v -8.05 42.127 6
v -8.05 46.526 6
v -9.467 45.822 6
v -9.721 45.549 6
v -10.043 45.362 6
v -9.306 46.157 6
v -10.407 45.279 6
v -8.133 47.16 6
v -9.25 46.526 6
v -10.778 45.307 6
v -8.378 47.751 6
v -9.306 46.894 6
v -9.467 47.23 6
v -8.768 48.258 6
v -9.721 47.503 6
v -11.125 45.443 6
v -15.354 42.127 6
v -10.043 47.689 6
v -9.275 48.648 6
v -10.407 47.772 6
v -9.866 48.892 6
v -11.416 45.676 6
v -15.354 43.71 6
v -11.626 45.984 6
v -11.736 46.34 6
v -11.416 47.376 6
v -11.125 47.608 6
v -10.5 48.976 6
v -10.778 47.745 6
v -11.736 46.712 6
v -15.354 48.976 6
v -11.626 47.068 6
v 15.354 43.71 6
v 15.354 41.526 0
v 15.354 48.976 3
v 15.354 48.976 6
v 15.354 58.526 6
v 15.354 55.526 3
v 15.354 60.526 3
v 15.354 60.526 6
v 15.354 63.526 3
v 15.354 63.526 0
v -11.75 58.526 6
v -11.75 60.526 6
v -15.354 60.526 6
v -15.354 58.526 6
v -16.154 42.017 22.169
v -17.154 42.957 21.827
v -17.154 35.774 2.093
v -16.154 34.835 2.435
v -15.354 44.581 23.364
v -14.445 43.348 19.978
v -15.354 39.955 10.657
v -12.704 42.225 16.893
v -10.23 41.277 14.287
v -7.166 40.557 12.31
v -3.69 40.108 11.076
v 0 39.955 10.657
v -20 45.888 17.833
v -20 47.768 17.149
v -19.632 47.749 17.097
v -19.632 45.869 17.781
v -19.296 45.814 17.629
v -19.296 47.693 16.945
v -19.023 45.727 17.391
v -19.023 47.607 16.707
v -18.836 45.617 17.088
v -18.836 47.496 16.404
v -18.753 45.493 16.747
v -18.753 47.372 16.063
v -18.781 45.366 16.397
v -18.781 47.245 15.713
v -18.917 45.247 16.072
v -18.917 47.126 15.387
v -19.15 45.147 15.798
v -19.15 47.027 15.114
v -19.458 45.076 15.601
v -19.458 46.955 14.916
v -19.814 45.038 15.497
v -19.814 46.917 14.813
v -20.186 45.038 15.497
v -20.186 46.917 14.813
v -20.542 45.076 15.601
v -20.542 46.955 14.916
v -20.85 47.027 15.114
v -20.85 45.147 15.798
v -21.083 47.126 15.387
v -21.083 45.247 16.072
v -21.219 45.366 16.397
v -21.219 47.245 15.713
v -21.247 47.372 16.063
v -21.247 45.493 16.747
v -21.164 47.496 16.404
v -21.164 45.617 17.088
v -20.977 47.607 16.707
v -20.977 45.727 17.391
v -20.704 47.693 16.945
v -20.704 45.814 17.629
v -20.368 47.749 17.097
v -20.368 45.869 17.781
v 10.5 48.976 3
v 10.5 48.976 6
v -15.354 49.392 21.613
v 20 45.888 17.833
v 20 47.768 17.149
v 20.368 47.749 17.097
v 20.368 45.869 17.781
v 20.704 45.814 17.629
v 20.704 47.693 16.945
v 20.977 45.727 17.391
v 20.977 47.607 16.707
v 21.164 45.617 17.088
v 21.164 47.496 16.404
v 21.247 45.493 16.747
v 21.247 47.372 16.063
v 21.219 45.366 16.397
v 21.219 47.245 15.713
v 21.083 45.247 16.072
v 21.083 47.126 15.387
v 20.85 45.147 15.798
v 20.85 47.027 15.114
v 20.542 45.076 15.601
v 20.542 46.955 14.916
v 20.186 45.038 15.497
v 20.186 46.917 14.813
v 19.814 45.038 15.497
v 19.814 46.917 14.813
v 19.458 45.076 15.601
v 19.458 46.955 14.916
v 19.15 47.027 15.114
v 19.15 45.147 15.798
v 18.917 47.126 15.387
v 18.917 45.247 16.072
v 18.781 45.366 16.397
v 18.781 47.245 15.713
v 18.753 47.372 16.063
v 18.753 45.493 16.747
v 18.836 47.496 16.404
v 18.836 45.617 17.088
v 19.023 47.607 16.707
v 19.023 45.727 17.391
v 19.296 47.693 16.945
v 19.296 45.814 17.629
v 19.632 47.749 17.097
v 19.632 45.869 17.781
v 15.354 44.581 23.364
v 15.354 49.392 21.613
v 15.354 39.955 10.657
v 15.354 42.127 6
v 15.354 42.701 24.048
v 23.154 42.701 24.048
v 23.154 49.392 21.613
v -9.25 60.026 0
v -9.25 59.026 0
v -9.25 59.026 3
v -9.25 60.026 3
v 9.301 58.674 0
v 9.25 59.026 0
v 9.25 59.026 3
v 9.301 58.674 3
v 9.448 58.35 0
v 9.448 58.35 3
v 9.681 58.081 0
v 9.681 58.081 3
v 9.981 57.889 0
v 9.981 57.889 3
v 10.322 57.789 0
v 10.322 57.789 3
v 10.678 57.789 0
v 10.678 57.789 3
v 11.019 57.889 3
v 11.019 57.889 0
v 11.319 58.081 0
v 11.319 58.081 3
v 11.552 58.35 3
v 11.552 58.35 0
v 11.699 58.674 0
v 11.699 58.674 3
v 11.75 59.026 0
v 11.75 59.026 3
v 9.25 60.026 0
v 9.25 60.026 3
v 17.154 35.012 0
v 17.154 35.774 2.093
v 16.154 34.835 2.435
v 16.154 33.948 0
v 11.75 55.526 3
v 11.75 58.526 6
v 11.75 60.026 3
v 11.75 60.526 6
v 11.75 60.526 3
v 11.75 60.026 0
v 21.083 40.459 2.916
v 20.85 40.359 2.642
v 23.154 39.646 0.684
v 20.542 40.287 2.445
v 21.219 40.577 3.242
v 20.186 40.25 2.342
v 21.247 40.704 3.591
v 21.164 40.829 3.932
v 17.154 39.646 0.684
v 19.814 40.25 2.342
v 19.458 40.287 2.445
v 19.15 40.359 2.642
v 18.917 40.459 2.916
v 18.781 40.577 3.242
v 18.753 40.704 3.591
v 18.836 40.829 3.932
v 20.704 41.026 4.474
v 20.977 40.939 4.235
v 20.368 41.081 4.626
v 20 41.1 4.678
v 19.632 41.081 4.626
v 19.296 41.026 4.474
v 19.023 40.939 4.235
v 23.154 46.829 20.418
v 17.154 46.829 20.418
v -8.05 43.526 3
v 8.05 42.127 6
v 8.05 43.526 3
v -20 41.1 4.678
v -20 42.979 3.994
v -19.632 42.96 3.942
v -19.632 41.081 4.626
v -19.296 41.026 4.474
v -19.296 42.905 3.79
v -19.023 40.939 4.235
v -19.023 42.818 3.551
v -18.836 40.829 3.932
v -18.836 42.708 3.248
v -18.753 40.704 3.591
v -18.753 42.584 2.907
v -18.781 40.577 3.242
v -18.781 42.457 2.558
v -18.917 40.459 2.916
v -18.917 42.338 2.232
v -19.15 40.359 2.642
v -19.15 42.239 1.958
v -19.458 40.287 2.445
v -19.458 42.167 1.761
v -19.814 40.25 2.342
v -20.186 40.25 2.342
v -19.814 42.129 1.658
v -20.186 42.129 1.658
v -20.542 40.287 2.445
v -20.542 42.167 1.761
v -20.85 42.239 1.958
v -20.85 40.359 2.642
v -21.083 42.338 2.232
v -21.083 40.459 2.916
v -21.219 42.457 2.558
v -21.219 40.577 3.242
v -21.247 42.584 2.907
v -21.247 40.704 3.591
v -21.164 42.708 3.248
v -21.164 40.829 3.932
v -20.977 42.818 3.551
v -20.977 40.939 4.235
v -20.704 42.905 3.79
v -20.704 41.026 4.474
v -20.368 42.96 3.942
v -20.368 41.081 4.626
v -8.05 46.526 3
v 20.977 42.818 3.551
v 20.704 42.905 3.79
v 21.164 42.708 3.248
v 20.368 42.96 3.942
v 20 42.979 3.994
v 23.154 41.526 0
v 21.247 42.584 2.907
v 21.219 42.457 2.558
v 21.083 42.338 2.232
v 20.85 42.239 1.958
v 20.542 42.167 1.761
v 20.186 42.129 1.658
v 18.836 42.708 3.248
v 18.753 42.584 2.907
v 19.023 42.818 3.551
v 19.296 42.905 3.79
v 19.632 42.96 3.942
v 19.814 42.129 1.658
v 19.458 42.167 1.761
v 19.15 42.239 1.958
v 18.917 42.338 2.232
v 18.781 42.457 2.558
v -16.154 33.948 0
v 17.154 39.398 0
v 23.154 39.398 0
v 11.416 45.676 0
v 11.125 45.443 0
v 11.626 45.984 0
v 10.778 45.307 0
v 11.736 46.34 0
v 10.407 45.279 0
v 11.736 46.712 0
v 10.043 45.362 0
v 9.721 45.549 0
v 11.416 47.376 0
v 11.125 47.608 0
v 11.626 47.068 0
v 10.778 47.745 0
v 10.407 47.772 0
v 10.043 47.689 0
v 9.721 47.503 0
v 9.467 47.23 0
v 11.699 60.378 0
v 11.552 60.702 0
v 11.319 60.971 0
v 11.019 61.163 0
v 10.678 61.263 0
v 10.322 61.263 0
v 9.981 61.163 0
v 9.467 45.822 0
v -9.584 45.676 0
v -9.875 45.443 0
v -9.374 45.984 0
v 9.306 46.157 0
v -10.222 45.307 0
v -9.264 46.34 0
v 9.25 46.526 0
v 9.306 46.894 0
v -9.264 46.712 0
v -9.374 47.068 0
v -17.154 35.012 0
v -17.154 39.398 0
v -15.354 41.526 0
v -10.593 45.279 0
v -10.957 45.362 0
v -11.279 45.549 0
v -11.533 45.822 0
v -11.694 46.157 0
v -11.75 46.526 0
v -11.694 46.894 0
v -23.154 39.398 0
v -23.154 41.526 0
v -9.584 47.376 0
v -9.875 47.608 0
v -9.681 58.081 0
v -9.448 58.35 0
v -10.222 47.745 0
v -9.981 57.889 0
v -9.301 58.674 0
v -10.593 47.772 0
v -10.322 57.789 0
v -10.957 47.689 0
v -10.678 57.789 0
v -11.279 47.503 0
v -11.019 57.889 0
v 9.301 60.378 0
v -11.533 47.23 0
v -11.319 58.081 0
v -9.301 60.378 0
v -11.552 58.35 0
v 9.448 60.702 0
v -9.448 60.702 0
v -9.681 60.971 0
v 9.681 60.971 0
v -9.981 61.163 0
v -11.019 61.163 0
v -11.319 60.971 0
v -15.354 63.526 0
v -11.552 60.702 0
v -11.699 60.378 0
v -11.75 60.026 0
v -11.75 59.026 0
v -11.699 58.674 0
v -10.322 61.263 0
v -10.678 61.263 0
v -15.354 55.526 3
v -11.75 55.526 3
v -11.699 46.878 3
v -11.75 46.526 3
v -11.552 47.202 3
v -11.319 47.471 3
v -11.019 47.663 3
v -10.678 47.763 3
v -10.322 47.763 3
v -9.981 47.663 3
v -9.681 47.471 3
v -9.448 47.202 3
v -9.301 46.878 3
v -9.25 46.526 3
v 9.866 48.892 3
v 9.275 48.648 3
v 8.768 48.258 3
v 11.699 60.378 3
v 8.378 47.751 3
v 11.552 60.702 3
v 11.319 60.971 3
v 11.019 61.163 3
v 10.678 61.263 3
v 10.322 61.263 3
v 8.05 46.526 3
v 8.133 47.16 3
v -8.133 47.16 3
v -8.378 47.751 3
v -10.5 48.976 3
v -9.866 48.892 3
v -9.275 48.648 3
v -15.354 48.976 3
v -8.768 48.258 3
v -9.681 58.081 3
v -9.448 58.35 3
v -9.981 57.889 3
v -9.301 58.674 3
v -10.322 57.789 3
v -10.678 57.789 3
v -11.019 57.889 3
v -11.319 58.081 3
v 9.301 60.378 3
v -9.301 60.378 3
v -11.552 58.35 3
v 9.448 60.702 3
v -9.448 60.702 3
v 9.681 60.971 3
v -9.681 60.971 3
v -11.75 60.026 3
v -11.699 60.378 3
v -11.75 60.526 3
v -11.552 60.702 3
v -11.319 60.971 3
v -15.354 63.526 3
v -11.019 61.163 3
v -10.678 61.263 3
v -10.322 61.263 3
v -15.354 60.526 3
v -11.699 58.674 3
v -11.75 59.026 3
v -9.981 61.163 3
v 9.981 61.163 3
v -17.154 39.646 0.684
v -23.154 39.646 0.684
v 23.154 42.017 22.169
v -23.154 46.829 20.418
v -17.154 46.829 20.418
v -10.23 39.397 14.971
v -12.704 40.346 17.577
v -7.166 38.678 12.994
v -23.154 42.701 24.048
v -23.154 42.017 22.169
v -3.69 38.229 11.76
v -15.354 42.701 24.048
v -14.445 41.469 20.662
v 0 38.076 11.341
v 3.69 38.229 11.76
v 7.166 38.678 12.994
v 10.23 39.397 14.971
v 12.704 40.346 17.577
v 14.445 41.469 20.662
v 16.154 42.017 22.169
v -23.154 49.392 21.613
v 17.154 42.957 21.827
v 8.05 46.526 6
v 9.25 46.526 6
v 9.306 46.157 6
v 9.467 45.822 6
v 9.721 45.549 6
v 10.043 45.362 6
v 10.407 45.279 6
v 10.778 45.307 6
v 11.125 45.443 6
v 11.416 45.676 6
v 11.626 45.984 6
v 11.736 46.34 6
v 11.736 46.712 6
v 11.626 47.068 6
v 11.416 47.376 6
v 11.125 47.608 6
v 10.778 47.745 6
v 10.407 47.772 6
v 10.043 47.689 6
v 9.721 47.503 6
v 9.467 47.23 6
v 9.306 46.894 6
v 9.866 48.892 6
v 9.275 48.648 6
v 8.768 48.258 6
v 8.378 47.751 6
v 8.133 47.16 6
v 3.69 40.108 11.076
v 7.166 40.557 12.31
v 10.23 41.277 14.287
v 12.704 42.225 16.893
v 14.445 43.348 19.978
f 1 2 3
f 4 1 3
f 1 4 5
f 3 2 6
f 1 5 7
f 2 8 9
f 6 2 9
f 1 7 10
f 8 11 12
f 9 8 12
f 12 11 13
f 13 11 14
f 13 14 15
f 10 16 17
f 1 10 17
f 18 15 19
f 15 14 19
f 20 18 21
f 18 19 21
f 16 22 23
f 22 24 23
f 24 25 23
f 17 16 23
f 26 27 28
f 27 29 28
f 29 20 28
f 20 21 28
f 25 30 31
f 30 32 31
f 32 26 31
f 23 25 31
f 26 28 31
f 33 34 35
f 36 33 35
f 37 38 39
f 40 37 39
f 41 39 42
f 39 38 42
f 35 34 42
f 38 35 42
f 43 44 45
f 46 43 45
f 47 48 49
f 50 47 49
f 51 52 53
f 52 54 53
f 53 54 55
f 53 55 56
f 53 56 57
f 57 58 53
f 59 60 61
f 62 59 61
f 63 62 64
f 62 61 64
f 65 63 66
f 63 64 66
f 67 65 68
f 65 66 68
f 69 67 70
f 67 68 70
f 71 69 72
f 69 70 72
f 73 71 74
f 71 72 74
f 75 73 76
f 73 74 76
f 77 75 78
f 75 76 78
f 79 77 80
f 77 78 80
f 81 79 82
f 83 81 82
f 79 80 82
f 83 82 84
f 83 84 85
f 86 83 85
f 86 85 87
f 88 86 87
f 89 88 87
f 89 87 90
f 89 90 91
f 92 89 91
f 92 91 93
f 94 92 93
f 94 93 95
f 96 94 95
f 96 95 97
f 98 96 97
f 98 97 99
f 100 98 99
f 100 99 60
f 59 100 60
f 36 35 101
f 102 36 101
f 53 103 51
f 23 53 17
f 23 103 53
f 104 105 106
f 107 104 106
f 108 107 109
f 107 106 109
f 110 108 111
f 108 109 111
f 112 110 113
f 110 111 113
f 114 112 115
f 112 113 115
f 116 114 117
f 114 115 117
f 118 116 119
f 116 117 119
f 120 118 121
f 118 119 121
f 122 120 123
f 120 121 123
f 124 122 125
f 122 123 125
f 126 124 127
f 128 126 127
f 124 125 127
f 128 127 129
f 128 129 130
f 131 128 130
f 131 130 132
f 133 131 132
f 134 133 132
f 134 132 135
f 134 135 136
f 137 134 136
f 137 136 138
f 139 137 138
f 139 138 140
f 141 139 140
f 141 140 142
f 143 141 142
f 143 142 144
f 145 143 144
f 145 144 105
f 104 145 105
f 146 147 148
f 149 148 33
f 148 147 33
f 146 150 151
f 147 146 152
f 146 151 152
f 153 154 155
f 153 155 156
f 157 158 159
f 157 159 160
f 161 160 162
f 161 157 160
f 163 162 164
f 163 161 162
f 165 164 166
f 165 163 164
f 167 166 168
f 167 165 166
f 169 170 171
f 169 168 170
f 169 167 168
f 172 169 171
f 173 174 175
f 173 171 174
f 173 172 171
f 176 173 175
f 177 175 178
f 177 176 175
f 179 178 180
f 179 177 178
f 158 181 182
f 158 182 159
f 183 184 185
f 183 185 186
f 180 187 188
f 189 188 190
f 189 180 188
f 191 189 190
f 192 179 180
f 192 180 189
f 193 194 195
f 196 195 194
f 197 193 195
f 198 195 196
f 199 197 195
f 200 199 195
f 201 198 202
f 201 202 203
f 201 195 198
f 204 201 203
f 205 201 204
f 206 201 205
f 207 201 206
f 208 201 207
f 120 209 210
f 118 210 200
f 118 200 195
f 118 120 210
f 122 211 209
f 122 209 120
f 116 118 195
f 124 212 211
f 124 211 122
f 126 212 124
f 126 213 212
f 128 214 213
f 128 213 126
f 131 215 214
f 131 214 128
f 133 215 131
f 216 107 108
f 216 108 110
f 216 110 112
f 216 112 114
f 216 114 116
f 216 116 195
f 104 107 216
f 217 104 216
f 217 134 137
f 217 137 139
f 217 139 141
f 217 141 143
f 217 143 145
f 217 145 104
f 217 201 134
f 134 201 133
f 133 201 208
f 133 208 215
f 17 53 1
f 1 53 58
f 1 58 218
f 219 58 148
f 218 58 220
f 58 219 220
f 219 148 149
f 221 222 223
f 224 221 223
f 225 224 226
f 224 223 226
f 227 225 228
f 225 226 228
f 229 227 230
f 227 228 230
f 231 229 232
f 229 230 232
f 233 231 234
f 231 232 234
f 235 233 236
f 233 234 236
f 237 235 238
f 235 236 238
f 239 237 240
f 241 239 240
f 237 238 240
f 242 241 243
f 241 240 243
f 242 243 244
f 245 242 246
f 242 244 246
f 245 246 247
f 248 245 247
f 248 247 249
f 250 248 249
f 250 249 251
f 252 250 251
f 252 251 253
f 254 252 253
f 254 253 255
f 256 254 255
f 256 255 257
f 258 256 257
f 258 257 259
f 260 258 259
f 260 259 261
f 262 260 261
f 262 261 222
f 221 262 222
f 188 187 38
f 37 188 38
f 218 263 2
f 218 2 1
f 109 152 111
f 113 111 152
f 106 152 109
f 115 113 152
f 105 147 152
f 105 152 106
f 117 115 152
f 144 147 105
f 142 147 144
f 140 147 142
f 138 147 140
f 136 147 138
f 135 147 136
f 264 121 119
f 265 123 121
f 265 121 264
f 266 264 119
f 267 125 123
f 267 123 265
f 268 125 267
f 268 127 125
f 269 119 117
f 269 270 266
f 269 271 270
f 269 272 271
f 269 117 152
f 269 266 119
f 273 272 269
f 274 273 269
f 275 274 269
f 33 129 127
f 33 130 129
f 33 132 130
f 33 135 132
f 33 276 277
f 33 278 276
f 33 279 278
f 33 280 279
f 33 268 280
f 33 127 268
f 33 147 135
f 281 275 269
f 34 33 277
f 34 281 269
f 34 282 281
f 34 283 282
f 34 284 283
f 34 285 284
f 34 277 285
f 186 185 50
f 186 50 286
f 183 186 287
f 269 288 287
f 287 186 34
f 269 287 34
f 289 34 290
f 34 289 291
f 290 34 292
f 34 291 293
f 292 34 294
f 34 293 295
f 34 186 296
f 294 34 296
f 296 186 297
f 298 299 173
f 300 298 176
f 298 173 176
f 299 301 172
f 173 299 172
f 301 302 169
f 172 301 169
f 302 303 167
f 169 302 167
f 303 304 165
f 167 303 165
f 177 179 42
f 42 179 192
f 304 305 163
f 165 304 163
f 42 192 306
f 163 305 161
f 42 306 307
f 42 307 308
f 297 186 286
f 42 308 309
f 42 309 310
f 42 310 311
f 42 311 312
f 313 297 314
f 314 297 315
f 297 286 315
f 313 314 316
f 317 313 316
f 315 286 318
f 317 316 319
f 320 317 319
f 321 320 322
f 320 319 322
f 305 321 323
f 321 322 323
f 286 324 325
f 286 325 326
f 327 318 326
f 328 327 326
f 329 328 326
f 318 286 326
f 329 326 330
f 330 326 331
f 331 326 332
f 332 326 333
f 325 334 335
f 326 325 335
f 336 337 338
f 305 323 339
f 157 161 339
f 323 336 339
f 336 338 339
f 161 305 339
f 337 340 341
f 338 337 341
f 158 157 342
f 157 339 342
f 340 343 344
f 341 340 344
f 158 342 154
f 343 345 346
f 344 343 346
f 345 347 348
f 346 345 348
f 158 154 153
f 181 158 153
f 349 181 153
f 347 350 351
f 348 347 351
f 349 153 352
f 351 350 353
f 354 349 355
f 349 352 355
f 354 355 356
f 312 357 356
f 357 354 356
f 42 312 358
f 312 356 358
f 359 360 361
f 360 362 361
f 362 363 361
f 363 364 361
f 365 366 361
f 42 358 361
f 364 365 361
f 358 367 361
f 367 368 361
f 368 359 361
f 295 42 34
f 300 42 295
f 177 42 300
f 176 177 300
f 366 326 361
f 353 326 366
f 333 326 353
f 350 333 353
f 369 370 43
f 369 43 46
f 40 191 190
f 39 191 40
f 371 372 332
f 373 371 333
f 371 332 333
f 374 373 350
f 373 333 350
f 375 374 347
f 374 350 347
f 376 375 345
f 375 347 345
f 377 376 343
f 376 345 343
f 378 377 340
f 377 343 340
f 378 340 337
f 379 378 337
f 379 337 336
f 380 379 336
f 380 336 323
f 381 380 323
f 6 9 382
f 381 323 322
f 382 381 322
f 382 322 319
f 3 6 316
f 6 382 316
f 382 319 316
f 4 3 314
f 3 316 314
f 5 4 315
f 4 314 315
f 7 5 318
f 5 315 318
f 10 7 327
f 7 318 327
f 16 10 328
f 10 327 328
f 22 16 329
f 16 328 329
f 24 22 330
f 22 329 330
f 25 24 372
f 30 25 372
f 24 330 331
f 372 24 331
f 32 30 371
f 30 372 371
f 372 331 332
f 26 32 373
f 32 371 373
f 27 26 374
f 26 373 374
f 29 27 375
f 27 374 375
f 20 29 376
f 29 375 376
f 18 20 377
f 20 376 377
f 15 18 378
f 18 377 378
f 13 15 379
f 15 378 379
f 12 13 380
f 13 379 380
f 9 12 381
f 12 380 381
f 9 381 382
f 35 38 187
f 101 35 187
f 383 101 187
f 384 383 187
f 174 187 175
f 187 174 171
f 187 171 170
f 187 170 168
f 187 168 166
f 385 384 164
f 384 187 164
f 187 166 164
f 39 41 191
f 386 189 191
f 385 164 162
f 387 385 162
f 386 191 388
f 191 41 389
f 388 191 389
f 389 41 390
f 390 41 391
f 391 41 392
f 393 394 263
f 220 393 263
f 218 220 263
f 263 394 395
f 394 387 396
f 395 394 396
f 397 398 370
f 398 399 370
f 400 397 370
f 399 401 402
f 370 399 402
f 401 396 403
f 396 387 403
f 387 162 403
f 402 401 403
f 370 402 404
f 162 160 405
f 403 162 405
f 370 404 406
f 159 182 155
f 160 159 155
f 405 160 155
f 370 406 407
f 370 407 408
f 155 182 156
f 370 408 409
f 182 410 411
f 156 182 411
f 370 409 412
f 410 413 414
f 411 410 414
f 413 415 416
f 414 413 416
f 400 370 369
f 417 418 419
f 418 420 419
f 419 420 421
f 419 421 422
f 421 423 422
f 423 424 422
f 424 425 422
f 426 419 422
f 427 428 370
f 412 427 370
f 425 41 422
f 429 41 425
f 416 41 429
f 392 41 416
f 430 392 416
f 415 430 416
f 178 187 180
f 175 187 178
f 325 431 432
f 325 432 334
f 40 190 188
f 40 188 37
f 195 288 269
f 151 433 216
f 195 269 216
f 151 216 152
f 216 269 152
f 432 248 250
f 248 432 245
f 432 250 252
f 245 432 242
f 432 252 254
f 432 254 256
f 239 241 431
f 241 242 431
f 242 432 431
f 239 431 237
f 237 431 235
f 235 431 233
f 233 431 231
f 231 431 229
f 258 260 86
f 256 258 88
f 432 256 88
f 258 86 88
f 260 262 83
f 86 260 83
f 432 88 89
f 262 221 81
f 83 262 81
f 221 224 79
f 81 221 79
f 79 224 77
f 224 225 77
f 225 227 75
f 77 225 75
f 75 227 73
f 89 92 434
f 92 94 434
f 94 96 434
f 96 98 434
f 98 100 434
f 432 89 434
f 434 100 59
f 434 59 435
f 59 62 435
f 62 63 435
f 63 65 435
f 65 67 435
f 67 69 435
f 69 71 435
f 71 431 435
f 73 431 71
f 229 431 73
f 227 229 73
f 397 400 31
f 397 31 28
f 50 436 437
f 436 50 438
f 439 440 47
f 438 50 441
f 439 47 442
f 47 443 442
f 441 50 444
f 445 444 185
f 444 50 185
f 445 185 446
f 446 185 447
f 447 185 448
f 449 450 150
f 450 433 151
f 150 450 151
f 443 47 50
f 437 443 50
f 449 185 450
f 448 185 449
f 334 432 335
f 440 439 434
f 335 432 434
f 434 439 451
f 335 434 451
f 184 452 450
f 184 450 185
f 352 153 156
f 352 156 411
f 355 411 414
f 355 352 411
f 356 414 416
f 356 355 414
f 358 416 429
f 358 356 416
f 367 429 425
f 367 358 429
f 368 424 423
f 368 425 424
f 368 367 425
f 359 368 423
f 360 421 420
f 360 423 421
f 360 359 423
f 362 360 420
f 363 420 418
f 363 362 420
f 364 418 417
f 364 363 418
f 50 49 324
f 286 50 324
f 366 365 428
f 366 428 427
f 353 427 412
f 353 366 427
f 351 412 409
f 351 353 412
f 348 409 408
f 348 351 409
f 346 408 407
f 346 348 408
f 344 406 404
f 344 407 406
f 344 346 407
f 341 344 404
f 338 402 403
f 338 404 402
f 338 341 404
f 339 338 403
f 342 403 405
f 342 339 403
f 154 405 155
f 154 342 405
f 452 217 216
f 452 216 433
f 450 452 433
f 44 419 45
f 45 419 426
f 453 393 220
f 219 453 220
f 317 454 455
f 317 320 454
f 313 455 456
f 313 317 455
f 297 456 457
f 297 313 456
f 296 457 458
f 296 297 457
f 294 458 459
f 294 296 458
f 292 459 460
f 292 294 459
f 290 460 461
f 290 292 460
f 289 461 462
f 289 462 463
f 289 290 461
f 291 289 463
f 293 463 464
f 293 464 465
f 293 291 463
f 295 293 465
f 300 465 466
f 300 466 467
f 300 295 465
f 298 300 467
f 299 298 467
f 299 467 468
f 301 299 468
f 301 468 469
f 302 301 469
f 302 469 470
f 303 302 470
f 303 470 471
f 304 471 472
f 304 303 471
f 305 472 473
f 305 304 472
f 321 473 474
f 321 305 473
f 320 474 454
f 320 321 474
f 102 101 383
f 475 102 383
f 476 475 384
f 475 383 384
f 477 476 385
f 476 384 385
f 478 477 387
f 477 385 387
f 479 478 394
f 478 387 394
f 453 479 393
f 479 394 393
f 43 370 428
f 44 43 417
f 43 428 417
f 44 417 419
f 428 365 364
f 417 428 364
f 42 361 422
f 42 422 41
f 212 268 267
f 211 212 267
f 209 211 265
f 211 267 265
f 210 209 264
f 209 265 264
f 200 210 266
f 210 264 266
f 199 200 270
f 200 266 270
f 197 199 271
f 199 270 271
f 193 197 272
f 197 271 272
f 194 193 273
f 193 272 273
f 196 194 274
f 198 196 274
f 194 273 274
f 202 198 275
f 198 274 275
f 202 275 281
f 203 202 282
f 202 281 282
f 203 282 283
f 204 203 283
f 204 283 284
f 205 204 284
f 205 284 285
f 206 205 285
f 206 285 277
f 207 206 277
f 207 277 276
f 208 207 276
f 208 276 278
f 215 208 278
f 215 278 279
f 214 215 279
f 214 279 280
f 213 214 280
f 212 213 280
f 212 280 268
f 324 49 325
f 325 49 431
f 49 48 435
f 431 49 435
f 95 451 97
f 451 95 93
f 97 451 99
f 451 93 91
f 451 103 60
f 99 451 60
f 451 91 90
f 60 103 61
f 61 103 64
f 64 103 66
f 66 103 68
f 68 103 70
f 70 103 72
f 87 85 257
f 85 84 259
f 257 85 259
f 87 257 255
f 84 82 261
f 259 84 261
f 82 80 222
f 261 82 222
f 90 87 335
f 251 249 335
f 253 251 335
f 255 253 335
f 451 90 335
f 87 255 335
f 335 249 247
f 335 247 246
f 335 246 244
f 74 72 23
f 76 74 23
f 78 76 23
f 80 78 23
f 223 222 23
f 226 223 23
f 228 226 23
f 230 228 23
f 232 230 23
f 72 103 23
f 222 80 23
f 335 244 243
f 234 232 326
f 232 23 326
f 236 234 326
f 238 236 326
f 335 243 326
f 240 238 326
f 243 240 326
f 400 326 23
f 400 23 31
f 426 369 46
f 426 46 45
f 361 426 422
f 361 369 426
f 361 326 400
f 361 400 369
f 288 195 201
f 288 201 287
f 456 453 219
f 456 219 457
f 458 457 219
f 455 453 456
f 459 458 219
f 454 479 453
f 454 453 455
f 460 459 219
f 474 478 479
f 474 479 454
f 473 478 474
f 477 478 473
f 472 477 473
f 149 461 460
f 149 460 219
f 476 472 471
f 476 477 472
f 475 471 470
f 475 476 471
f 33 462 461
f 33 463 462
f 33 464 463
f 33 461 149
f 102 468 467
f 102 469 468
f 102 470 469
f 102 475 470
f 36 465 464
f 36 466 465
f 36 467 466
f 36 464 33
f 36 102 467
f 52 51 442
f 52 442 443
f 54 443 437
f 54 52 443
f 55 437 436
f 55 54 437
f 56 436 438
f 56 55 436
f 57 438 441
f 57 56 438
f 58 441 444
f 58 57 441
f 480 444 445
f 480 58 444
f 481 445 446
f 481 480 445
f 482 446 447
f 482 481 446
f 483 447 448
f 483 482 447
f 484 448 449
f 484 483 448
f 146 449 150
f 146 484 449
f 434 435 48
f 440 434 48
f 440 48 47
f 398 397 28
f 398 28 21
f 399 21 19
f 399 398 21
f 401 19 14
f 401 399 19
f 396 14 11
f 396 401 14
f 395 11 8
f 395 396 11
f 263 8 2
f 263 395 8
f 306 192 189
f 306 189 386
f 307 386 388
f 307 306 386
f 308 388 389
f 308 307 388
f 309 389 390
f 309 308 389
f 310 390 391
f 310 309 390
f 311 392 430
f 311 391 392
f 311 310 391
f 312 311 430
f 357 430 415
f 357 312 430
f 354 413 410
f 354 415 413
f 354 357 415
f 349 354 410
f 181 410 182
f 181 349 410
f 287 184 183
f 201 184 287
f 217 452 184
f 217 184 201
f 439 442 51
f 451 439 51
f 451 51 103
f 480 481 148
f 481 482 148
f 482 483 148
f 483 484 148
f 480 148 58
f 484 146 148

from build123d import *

# Parameters (mm, degrees)
BOSS_EXTRUDE1_DEPTH             = 3
BOSS_EXTRUDE2_REACH             = 67.424
BOSS_EXTRUDE2_DIRECTION_2_REACH = 67.424
BOSS_EXTRUDE3_DEPTH             = 1.8
BOSS_EXTRUDE4_DEPTH             = 6
SKETCH5_R                       = 1.2500000000000013
CUT_EXTRUDE1_DEPTH              = 52.534261642227
BOSS_EXTRUDE5_START             = -17.153882977
BOSS_EXTRUDE5_DEPTH             = 34.307765954
BOSS_EXTRUDE5_START_2           = -23.153882977
BOSS_EXTRUDE5_2_DEPTH           = 46.307765954
SKETCH7_R                       = 1.2499999999999996
CUT_EXTRUDE2_DEPTH              = 72.76321538065721
SKETCH8_R                       = 1.2499999999999996
SKETCH8_W                       = 3.603882977174097
SKETCH8_H                       = 2
BOSS_EXTRUDE6_DEPTH             = 3
CHAMFER1_SIZE                   = 3
CHAMFER3_SIZE                   = 1
CUT_EXTRUDE3_DEPTH              = 54.0045843552169


# Read off the part's stored shape, not the designer's step: Boss-Extrude5
with BuildPart() as part:
    # Sketch1 → Boss-Extrude1 (new body)
    with BuildSketch(Plane.XY):
        Polygon((15.353882977174102, 43.52586008583906), (-15.3538829771741, 43.52586008583904), (-15.3538829771741, 63.52586008583905), (15.3538829771741, 63.52586008583905), align=None)
    extrude(amount=BOSS_EXTRUDE1_DEPTH)

    # Boss-Extrude2: up to this face of the body (flat: up to its plane)
    boss_extrude2_end = Plane(part.part.faces().sort_by_distance((15.353882977, 53.525860086, 1.5))[0])
    # Sketch2 → Boss-Extrude2 (add, up to the picked face)
    with BuildSketch(Plane(origin=(0, 0, 0), x_dir=(0, 0, -1), z_dir=(1, 0, 0)), mode=Mode.PRIVATE) as boss_extrude2_sk1:
        Polygon((-3, 43.52586008583906), (0, 43.52586008583906), (0, 41.52586008583906), (-2.4353936802444784, 34.83467094188486), (-24.048323958320367, 42.701134238375246), (-23.36428367166903, 44.580519479947064), (-10.656874598929635, 39.95540082282564), align=None)
    boss_extrude2_tool1 = split(extrude(boss_extrude2_sk1.sketch, amount=BOSS_EXTRUDE2_REACH, mode=Mode.PRIVATE), bisect_by=boss_extrude2_end, keep=Keep.BOTH, mode=Mode.PRIVATE)
    add(boss_extrude2_tool1.solids().sort_by(Axis((0, 40.026068, 8.762362), (1, 0, 0)))[0])

    # Boss-Extrude2 direction 2: up to this face of the body (flat: up to its plane)
    boss_extrude2_direction_2_end = Plane(part.part.faces().sort_by_distance((-15.353882977, 53.525860086, 1.5))[0])
    # Sketch2 → Boss-Extrude2 direction 2 (add, up to the picked face)
    with BuildSketch(Plane(origin=(0, 0, 0), x_dir=(0, 0, -1), z_dir=(1, 0, 0)), mode=Mode.PRIVATE) as boss_extrude2_direction_2_sk1:
        Polygon((-3, 43.52586008583906), (0, 43.52586008583906), (0, 41.52586008583906), (-2.4353936802444784, 34.83467094188486), (-24.048323958320367, 42.701134238375246), (-23.36428367166903, 44.580519479947064), (-10.656874598929635, 39.95540082282564), align=None)
    boss_extrude2_direction_2_tool1 = split(extrude(boss_extrude2_direction_2_sk1.sketch, amount=-BOSS_EXTRUDE2_DIRECTION_2_REACH, mode=Mode.PRIVATE), bisect_by=boss_extrude2_direction_2_end, keep=Keep.BOTH, mode=Mode.PRIVATE)
    add(boss_extrude2_direction_2_tool1.solids().sort_by(Axis((0, 40.026068, 8.762362), (-1, 0, 0)))[0])

    # Sketch3 → Boss-Extrude3 (add)
    with BuildSketch(Plane(origin=(15.353882977174106, 1.33e-15, 0), x_dir=(0, 0, -1), z_dir=(1, 9e-17, 0))):
        Polygon((-24.048323958320367, 42.701134238375246), (-2.4353936802444798, 34.83467094188486), (3.04e-15, 41.52586008583906), (-21.61293027807589, 49.392323382329444), align=None)
    boss_extrude3 = extrude(amount=BOSS_EXTRUDE3_DEPTH)

    # Sketch4 → Boss-Extrude4 (add)
    with BuildSketch(Plane(origin=(17.1538829771741, 0, 0), x_dir=(0, 0, -1), z_dir=(1, 0, 0))):
        Polygon((-24.048323958320367, 42.701134238375246), (-21.61293027807589, 49.392323382329444), (2.6e-15, 41.52586008583906), (-0.6840402866513355, 39.64647484426724), (-20.41758532315541, 46.82889785410629), (-22.168938716748553, 42.01709395172391), align=None)
    boss_extrude4 = extrude(amount=BOSS_EXTRUDE4_DEPTH)

    # Mirror1: Boss-Extrude3, Boss-Extrude4 across plane
    add(boss_extrude3.mirror(Plane(origin=(0, 0, 0), x_dir=(0, 0, 1), z_dir=(1, 0, 0))))
    add(boss_extrude4.mirror(Plane(origin=(0, 0, 0), x_dir=(0, 0, 1), z_dir=(1, 0, 0))))

    # Sketch5 → Cut-Extrude1 (cut, through all)
    with BuildSketch(Plane(origin=(3.18e-15, 36.66825722516614, -13.34615417237709), x_dir=(1, -8e-17, 3e-17), z_dir=(0, 0.9396926207859083, -0.3420201433256693))):
        with Locations(Location((-20.000000000000004, -31.20268061828034, 0), (0, 0, 270))):
            Circle(SKETCH5_R)
        with Locations(Location((-20.000000000000004, -17.20268061828034, 0), (0, 0, 270))):
            Circle(SKETCH5_R)
        with Locations(Location((19.999999999999996, -17.202680618280336, 0), (0, 0, 270))):
            Circle(SKETCH5_R)
        with Locations(Location((19.999999999999996, -31.202680618280336, 0), (0, 0, 270))):
            Circle(SKETCH5_R)
    extrude(amount=-CUT_EXTRUDE1_DEPTH, mode=Mode.SUBTRACT)

    # Boss-Extrude5 outline → Boss-Extrude5 (add)
    with BuildSketch(Plane.YZ.offset(BOSS_EXTRUDE5_START)):
        Polygon((41.525860086, 0), (34.834670942, 2.43539368), (33.948260134, 0), align=None)
    extrude(amount=BOSS_EXTRUDE5_DEPTH)

    # Boss-Extrude5 2 outline → Boss-Extrude5 2 (add)
    with BuildSketch(Plane.YZ.offset(BOSS_EXTRUDE5_START_2)):
        Polygon((39.397504541, 0), (41.525860086, 0), (39.646474844, 0.684040287), align=None)
    extrude(amount=BOSS_EXTRUDE5_2_DEPTH)

    # Sketch7 → Cut-Extrude2 (cut, through all)
    with BuildSketch(Plane(origin=(0, 0, 0), x_dir=(-1, 0, 0), z_dir=(0, 0, -1))):
        with Locations((-10.500000000000007, 46.525860085839064)):
            Circle(SKETCH7_R)
        with Locations((10.499999999999993, 46.52586008583907)):
            Circle(SKETCH7_R)
        with BuildLine():
            Line((-11.750000000000007, 59.02586008583907), (-11.750000000000007, 60.02586008583906))
            ThreePointArc((-11.750000000000007, 60.02586008583906), (-10.500000000000009, 61.27586008583905), (-9.250000000000016, 60.02586008583906))
            Line((-9.250000000000016, 60.02586008583906), (-9.250000000000016, 59.02586008583907))
            ThreePointArc((-9.250000000000016, 59.02586008583907), (-10.500000000000009, 57.77586008583907), (-11.750000000000007, 59.02586008583907))
        make_face()
        with BuildLine():
            Line((9.249999999999991, 59.02586008583907), (9.249999999999991, 60.02586008583906))
            ThreePointArc((9.249999999999991, 60.02586008583906), (10.499999999999984, 61.27586008583906), (11.749999999999982, 60.02586008583906))
            Line((11.749999999999982, 60.02586008583906), (11.749999999999982, 59.02586008583907))
            ThreePointArc((11.749999999999982, 59.02586008583907), (10.499999999999995, 57.77586008583907), (9.249999999999991, 59.02586008583907))
        make_face()
    extrude(amount=-CUT_EXTRUDE2_DEPTH, mode=Mode.SUBTRACT)

    # Sketch8 → Boss-Extrude6 (add)
    # profile 1 of 2: a face of its own
    with BuildSketch(Plane.XY.offset(3)):
        with BuildLine():
            Line((15.353882977174102, 48.97586008583905), (10.500000000000007, 48.97586008583905))
            ThreePointArc((10.500000000000007, 48.97586008583905), (8.767588386092974, 48.258271699746096), (8.050000000000013, 46.525860085839064))
            Line((8.050000000000013, 46.525860085839064), (8.050000000000015, 40.525860085839064))
            Line((8.050000000000015, 40.525860085839064), (15.353882977174102, 40.525860085839064))
            Line((15.353882977174102, 40.525860085839064), (15.353882977174102, 48.97586008583905))
        make_face()
        with Locations(Location((10.500000000000007, 46.525860085839064, 0), (0, 0, 180))):
            Circle(SKETCH8_R, mode=Mode.SUBTRACT)
    # profile 2 of 2: a face of its own
    with BuildSketch(Plane.XY.offset(3)):
        with Locations((13.551941488587055, 59.52586008583907)):
            Rectangle(SKETCH8_W, SKETCH8_H)
    boss_extrude6 = extrude(amount=BOSS_EXTRUDE6_DEPTH)

    # Mirror2: Boss-Extrude6 across plane
    add(boss_extrude6.mirror(Plane(origin=(0, 0, 0), x_dir=(0, 0, 1), z_dir=(1, 0, 0))))

    # Chamfer1
    chamfer1_edges = [part.edges().sort_by_distance(p)[0] for p in [
        (13.551941488587055, 58.525860085839064, 3),
        (-13.551941488587055, 58.525860085839064, 3),
    ]]
    chamfer(chamfer1_edges, length=CHAMFER1_SIZE - 0.0001)  # a hair under: the kernel refuses the full size

    # Chamfer3
    chamfer3_edges = [part.edges().sort_by_distance(p)[0] for p in [
        (17.153882977174103, 38.42588244680438, 12.302166198496515),
        (-17.1538829771741, 38.42588244680438, 12.302166198496515),
    ]]
    chamfer(chamfer3_edges, length=CHAMFER3_SIZE)

    # Sketch9 → Cut-Extrude3 (cut, through all)
    with BuildSketch(Plane(origin=(0, 31.856453322783743, -11.59480077878396), x_dir=(1, 0, 0), z_dir=(0, 0.9396926207859083, -0.3420201433256693))):
        with BuildLine():
            Line((15.353882977174102, -37.20268061828036), (-15.3538829771741, -37.20268061828037))
            ThreePointArc((-15.3538829771741, -37.20268061828037), (-4.5e-16, -23.67973833731235), (15.353882977174102, -37.20268061828036))
        make_face()
    extrude(amount=-CUT_EXTRUDE3_DEPTH, mode=Mode.SUBTRACT)


solid = part.part
